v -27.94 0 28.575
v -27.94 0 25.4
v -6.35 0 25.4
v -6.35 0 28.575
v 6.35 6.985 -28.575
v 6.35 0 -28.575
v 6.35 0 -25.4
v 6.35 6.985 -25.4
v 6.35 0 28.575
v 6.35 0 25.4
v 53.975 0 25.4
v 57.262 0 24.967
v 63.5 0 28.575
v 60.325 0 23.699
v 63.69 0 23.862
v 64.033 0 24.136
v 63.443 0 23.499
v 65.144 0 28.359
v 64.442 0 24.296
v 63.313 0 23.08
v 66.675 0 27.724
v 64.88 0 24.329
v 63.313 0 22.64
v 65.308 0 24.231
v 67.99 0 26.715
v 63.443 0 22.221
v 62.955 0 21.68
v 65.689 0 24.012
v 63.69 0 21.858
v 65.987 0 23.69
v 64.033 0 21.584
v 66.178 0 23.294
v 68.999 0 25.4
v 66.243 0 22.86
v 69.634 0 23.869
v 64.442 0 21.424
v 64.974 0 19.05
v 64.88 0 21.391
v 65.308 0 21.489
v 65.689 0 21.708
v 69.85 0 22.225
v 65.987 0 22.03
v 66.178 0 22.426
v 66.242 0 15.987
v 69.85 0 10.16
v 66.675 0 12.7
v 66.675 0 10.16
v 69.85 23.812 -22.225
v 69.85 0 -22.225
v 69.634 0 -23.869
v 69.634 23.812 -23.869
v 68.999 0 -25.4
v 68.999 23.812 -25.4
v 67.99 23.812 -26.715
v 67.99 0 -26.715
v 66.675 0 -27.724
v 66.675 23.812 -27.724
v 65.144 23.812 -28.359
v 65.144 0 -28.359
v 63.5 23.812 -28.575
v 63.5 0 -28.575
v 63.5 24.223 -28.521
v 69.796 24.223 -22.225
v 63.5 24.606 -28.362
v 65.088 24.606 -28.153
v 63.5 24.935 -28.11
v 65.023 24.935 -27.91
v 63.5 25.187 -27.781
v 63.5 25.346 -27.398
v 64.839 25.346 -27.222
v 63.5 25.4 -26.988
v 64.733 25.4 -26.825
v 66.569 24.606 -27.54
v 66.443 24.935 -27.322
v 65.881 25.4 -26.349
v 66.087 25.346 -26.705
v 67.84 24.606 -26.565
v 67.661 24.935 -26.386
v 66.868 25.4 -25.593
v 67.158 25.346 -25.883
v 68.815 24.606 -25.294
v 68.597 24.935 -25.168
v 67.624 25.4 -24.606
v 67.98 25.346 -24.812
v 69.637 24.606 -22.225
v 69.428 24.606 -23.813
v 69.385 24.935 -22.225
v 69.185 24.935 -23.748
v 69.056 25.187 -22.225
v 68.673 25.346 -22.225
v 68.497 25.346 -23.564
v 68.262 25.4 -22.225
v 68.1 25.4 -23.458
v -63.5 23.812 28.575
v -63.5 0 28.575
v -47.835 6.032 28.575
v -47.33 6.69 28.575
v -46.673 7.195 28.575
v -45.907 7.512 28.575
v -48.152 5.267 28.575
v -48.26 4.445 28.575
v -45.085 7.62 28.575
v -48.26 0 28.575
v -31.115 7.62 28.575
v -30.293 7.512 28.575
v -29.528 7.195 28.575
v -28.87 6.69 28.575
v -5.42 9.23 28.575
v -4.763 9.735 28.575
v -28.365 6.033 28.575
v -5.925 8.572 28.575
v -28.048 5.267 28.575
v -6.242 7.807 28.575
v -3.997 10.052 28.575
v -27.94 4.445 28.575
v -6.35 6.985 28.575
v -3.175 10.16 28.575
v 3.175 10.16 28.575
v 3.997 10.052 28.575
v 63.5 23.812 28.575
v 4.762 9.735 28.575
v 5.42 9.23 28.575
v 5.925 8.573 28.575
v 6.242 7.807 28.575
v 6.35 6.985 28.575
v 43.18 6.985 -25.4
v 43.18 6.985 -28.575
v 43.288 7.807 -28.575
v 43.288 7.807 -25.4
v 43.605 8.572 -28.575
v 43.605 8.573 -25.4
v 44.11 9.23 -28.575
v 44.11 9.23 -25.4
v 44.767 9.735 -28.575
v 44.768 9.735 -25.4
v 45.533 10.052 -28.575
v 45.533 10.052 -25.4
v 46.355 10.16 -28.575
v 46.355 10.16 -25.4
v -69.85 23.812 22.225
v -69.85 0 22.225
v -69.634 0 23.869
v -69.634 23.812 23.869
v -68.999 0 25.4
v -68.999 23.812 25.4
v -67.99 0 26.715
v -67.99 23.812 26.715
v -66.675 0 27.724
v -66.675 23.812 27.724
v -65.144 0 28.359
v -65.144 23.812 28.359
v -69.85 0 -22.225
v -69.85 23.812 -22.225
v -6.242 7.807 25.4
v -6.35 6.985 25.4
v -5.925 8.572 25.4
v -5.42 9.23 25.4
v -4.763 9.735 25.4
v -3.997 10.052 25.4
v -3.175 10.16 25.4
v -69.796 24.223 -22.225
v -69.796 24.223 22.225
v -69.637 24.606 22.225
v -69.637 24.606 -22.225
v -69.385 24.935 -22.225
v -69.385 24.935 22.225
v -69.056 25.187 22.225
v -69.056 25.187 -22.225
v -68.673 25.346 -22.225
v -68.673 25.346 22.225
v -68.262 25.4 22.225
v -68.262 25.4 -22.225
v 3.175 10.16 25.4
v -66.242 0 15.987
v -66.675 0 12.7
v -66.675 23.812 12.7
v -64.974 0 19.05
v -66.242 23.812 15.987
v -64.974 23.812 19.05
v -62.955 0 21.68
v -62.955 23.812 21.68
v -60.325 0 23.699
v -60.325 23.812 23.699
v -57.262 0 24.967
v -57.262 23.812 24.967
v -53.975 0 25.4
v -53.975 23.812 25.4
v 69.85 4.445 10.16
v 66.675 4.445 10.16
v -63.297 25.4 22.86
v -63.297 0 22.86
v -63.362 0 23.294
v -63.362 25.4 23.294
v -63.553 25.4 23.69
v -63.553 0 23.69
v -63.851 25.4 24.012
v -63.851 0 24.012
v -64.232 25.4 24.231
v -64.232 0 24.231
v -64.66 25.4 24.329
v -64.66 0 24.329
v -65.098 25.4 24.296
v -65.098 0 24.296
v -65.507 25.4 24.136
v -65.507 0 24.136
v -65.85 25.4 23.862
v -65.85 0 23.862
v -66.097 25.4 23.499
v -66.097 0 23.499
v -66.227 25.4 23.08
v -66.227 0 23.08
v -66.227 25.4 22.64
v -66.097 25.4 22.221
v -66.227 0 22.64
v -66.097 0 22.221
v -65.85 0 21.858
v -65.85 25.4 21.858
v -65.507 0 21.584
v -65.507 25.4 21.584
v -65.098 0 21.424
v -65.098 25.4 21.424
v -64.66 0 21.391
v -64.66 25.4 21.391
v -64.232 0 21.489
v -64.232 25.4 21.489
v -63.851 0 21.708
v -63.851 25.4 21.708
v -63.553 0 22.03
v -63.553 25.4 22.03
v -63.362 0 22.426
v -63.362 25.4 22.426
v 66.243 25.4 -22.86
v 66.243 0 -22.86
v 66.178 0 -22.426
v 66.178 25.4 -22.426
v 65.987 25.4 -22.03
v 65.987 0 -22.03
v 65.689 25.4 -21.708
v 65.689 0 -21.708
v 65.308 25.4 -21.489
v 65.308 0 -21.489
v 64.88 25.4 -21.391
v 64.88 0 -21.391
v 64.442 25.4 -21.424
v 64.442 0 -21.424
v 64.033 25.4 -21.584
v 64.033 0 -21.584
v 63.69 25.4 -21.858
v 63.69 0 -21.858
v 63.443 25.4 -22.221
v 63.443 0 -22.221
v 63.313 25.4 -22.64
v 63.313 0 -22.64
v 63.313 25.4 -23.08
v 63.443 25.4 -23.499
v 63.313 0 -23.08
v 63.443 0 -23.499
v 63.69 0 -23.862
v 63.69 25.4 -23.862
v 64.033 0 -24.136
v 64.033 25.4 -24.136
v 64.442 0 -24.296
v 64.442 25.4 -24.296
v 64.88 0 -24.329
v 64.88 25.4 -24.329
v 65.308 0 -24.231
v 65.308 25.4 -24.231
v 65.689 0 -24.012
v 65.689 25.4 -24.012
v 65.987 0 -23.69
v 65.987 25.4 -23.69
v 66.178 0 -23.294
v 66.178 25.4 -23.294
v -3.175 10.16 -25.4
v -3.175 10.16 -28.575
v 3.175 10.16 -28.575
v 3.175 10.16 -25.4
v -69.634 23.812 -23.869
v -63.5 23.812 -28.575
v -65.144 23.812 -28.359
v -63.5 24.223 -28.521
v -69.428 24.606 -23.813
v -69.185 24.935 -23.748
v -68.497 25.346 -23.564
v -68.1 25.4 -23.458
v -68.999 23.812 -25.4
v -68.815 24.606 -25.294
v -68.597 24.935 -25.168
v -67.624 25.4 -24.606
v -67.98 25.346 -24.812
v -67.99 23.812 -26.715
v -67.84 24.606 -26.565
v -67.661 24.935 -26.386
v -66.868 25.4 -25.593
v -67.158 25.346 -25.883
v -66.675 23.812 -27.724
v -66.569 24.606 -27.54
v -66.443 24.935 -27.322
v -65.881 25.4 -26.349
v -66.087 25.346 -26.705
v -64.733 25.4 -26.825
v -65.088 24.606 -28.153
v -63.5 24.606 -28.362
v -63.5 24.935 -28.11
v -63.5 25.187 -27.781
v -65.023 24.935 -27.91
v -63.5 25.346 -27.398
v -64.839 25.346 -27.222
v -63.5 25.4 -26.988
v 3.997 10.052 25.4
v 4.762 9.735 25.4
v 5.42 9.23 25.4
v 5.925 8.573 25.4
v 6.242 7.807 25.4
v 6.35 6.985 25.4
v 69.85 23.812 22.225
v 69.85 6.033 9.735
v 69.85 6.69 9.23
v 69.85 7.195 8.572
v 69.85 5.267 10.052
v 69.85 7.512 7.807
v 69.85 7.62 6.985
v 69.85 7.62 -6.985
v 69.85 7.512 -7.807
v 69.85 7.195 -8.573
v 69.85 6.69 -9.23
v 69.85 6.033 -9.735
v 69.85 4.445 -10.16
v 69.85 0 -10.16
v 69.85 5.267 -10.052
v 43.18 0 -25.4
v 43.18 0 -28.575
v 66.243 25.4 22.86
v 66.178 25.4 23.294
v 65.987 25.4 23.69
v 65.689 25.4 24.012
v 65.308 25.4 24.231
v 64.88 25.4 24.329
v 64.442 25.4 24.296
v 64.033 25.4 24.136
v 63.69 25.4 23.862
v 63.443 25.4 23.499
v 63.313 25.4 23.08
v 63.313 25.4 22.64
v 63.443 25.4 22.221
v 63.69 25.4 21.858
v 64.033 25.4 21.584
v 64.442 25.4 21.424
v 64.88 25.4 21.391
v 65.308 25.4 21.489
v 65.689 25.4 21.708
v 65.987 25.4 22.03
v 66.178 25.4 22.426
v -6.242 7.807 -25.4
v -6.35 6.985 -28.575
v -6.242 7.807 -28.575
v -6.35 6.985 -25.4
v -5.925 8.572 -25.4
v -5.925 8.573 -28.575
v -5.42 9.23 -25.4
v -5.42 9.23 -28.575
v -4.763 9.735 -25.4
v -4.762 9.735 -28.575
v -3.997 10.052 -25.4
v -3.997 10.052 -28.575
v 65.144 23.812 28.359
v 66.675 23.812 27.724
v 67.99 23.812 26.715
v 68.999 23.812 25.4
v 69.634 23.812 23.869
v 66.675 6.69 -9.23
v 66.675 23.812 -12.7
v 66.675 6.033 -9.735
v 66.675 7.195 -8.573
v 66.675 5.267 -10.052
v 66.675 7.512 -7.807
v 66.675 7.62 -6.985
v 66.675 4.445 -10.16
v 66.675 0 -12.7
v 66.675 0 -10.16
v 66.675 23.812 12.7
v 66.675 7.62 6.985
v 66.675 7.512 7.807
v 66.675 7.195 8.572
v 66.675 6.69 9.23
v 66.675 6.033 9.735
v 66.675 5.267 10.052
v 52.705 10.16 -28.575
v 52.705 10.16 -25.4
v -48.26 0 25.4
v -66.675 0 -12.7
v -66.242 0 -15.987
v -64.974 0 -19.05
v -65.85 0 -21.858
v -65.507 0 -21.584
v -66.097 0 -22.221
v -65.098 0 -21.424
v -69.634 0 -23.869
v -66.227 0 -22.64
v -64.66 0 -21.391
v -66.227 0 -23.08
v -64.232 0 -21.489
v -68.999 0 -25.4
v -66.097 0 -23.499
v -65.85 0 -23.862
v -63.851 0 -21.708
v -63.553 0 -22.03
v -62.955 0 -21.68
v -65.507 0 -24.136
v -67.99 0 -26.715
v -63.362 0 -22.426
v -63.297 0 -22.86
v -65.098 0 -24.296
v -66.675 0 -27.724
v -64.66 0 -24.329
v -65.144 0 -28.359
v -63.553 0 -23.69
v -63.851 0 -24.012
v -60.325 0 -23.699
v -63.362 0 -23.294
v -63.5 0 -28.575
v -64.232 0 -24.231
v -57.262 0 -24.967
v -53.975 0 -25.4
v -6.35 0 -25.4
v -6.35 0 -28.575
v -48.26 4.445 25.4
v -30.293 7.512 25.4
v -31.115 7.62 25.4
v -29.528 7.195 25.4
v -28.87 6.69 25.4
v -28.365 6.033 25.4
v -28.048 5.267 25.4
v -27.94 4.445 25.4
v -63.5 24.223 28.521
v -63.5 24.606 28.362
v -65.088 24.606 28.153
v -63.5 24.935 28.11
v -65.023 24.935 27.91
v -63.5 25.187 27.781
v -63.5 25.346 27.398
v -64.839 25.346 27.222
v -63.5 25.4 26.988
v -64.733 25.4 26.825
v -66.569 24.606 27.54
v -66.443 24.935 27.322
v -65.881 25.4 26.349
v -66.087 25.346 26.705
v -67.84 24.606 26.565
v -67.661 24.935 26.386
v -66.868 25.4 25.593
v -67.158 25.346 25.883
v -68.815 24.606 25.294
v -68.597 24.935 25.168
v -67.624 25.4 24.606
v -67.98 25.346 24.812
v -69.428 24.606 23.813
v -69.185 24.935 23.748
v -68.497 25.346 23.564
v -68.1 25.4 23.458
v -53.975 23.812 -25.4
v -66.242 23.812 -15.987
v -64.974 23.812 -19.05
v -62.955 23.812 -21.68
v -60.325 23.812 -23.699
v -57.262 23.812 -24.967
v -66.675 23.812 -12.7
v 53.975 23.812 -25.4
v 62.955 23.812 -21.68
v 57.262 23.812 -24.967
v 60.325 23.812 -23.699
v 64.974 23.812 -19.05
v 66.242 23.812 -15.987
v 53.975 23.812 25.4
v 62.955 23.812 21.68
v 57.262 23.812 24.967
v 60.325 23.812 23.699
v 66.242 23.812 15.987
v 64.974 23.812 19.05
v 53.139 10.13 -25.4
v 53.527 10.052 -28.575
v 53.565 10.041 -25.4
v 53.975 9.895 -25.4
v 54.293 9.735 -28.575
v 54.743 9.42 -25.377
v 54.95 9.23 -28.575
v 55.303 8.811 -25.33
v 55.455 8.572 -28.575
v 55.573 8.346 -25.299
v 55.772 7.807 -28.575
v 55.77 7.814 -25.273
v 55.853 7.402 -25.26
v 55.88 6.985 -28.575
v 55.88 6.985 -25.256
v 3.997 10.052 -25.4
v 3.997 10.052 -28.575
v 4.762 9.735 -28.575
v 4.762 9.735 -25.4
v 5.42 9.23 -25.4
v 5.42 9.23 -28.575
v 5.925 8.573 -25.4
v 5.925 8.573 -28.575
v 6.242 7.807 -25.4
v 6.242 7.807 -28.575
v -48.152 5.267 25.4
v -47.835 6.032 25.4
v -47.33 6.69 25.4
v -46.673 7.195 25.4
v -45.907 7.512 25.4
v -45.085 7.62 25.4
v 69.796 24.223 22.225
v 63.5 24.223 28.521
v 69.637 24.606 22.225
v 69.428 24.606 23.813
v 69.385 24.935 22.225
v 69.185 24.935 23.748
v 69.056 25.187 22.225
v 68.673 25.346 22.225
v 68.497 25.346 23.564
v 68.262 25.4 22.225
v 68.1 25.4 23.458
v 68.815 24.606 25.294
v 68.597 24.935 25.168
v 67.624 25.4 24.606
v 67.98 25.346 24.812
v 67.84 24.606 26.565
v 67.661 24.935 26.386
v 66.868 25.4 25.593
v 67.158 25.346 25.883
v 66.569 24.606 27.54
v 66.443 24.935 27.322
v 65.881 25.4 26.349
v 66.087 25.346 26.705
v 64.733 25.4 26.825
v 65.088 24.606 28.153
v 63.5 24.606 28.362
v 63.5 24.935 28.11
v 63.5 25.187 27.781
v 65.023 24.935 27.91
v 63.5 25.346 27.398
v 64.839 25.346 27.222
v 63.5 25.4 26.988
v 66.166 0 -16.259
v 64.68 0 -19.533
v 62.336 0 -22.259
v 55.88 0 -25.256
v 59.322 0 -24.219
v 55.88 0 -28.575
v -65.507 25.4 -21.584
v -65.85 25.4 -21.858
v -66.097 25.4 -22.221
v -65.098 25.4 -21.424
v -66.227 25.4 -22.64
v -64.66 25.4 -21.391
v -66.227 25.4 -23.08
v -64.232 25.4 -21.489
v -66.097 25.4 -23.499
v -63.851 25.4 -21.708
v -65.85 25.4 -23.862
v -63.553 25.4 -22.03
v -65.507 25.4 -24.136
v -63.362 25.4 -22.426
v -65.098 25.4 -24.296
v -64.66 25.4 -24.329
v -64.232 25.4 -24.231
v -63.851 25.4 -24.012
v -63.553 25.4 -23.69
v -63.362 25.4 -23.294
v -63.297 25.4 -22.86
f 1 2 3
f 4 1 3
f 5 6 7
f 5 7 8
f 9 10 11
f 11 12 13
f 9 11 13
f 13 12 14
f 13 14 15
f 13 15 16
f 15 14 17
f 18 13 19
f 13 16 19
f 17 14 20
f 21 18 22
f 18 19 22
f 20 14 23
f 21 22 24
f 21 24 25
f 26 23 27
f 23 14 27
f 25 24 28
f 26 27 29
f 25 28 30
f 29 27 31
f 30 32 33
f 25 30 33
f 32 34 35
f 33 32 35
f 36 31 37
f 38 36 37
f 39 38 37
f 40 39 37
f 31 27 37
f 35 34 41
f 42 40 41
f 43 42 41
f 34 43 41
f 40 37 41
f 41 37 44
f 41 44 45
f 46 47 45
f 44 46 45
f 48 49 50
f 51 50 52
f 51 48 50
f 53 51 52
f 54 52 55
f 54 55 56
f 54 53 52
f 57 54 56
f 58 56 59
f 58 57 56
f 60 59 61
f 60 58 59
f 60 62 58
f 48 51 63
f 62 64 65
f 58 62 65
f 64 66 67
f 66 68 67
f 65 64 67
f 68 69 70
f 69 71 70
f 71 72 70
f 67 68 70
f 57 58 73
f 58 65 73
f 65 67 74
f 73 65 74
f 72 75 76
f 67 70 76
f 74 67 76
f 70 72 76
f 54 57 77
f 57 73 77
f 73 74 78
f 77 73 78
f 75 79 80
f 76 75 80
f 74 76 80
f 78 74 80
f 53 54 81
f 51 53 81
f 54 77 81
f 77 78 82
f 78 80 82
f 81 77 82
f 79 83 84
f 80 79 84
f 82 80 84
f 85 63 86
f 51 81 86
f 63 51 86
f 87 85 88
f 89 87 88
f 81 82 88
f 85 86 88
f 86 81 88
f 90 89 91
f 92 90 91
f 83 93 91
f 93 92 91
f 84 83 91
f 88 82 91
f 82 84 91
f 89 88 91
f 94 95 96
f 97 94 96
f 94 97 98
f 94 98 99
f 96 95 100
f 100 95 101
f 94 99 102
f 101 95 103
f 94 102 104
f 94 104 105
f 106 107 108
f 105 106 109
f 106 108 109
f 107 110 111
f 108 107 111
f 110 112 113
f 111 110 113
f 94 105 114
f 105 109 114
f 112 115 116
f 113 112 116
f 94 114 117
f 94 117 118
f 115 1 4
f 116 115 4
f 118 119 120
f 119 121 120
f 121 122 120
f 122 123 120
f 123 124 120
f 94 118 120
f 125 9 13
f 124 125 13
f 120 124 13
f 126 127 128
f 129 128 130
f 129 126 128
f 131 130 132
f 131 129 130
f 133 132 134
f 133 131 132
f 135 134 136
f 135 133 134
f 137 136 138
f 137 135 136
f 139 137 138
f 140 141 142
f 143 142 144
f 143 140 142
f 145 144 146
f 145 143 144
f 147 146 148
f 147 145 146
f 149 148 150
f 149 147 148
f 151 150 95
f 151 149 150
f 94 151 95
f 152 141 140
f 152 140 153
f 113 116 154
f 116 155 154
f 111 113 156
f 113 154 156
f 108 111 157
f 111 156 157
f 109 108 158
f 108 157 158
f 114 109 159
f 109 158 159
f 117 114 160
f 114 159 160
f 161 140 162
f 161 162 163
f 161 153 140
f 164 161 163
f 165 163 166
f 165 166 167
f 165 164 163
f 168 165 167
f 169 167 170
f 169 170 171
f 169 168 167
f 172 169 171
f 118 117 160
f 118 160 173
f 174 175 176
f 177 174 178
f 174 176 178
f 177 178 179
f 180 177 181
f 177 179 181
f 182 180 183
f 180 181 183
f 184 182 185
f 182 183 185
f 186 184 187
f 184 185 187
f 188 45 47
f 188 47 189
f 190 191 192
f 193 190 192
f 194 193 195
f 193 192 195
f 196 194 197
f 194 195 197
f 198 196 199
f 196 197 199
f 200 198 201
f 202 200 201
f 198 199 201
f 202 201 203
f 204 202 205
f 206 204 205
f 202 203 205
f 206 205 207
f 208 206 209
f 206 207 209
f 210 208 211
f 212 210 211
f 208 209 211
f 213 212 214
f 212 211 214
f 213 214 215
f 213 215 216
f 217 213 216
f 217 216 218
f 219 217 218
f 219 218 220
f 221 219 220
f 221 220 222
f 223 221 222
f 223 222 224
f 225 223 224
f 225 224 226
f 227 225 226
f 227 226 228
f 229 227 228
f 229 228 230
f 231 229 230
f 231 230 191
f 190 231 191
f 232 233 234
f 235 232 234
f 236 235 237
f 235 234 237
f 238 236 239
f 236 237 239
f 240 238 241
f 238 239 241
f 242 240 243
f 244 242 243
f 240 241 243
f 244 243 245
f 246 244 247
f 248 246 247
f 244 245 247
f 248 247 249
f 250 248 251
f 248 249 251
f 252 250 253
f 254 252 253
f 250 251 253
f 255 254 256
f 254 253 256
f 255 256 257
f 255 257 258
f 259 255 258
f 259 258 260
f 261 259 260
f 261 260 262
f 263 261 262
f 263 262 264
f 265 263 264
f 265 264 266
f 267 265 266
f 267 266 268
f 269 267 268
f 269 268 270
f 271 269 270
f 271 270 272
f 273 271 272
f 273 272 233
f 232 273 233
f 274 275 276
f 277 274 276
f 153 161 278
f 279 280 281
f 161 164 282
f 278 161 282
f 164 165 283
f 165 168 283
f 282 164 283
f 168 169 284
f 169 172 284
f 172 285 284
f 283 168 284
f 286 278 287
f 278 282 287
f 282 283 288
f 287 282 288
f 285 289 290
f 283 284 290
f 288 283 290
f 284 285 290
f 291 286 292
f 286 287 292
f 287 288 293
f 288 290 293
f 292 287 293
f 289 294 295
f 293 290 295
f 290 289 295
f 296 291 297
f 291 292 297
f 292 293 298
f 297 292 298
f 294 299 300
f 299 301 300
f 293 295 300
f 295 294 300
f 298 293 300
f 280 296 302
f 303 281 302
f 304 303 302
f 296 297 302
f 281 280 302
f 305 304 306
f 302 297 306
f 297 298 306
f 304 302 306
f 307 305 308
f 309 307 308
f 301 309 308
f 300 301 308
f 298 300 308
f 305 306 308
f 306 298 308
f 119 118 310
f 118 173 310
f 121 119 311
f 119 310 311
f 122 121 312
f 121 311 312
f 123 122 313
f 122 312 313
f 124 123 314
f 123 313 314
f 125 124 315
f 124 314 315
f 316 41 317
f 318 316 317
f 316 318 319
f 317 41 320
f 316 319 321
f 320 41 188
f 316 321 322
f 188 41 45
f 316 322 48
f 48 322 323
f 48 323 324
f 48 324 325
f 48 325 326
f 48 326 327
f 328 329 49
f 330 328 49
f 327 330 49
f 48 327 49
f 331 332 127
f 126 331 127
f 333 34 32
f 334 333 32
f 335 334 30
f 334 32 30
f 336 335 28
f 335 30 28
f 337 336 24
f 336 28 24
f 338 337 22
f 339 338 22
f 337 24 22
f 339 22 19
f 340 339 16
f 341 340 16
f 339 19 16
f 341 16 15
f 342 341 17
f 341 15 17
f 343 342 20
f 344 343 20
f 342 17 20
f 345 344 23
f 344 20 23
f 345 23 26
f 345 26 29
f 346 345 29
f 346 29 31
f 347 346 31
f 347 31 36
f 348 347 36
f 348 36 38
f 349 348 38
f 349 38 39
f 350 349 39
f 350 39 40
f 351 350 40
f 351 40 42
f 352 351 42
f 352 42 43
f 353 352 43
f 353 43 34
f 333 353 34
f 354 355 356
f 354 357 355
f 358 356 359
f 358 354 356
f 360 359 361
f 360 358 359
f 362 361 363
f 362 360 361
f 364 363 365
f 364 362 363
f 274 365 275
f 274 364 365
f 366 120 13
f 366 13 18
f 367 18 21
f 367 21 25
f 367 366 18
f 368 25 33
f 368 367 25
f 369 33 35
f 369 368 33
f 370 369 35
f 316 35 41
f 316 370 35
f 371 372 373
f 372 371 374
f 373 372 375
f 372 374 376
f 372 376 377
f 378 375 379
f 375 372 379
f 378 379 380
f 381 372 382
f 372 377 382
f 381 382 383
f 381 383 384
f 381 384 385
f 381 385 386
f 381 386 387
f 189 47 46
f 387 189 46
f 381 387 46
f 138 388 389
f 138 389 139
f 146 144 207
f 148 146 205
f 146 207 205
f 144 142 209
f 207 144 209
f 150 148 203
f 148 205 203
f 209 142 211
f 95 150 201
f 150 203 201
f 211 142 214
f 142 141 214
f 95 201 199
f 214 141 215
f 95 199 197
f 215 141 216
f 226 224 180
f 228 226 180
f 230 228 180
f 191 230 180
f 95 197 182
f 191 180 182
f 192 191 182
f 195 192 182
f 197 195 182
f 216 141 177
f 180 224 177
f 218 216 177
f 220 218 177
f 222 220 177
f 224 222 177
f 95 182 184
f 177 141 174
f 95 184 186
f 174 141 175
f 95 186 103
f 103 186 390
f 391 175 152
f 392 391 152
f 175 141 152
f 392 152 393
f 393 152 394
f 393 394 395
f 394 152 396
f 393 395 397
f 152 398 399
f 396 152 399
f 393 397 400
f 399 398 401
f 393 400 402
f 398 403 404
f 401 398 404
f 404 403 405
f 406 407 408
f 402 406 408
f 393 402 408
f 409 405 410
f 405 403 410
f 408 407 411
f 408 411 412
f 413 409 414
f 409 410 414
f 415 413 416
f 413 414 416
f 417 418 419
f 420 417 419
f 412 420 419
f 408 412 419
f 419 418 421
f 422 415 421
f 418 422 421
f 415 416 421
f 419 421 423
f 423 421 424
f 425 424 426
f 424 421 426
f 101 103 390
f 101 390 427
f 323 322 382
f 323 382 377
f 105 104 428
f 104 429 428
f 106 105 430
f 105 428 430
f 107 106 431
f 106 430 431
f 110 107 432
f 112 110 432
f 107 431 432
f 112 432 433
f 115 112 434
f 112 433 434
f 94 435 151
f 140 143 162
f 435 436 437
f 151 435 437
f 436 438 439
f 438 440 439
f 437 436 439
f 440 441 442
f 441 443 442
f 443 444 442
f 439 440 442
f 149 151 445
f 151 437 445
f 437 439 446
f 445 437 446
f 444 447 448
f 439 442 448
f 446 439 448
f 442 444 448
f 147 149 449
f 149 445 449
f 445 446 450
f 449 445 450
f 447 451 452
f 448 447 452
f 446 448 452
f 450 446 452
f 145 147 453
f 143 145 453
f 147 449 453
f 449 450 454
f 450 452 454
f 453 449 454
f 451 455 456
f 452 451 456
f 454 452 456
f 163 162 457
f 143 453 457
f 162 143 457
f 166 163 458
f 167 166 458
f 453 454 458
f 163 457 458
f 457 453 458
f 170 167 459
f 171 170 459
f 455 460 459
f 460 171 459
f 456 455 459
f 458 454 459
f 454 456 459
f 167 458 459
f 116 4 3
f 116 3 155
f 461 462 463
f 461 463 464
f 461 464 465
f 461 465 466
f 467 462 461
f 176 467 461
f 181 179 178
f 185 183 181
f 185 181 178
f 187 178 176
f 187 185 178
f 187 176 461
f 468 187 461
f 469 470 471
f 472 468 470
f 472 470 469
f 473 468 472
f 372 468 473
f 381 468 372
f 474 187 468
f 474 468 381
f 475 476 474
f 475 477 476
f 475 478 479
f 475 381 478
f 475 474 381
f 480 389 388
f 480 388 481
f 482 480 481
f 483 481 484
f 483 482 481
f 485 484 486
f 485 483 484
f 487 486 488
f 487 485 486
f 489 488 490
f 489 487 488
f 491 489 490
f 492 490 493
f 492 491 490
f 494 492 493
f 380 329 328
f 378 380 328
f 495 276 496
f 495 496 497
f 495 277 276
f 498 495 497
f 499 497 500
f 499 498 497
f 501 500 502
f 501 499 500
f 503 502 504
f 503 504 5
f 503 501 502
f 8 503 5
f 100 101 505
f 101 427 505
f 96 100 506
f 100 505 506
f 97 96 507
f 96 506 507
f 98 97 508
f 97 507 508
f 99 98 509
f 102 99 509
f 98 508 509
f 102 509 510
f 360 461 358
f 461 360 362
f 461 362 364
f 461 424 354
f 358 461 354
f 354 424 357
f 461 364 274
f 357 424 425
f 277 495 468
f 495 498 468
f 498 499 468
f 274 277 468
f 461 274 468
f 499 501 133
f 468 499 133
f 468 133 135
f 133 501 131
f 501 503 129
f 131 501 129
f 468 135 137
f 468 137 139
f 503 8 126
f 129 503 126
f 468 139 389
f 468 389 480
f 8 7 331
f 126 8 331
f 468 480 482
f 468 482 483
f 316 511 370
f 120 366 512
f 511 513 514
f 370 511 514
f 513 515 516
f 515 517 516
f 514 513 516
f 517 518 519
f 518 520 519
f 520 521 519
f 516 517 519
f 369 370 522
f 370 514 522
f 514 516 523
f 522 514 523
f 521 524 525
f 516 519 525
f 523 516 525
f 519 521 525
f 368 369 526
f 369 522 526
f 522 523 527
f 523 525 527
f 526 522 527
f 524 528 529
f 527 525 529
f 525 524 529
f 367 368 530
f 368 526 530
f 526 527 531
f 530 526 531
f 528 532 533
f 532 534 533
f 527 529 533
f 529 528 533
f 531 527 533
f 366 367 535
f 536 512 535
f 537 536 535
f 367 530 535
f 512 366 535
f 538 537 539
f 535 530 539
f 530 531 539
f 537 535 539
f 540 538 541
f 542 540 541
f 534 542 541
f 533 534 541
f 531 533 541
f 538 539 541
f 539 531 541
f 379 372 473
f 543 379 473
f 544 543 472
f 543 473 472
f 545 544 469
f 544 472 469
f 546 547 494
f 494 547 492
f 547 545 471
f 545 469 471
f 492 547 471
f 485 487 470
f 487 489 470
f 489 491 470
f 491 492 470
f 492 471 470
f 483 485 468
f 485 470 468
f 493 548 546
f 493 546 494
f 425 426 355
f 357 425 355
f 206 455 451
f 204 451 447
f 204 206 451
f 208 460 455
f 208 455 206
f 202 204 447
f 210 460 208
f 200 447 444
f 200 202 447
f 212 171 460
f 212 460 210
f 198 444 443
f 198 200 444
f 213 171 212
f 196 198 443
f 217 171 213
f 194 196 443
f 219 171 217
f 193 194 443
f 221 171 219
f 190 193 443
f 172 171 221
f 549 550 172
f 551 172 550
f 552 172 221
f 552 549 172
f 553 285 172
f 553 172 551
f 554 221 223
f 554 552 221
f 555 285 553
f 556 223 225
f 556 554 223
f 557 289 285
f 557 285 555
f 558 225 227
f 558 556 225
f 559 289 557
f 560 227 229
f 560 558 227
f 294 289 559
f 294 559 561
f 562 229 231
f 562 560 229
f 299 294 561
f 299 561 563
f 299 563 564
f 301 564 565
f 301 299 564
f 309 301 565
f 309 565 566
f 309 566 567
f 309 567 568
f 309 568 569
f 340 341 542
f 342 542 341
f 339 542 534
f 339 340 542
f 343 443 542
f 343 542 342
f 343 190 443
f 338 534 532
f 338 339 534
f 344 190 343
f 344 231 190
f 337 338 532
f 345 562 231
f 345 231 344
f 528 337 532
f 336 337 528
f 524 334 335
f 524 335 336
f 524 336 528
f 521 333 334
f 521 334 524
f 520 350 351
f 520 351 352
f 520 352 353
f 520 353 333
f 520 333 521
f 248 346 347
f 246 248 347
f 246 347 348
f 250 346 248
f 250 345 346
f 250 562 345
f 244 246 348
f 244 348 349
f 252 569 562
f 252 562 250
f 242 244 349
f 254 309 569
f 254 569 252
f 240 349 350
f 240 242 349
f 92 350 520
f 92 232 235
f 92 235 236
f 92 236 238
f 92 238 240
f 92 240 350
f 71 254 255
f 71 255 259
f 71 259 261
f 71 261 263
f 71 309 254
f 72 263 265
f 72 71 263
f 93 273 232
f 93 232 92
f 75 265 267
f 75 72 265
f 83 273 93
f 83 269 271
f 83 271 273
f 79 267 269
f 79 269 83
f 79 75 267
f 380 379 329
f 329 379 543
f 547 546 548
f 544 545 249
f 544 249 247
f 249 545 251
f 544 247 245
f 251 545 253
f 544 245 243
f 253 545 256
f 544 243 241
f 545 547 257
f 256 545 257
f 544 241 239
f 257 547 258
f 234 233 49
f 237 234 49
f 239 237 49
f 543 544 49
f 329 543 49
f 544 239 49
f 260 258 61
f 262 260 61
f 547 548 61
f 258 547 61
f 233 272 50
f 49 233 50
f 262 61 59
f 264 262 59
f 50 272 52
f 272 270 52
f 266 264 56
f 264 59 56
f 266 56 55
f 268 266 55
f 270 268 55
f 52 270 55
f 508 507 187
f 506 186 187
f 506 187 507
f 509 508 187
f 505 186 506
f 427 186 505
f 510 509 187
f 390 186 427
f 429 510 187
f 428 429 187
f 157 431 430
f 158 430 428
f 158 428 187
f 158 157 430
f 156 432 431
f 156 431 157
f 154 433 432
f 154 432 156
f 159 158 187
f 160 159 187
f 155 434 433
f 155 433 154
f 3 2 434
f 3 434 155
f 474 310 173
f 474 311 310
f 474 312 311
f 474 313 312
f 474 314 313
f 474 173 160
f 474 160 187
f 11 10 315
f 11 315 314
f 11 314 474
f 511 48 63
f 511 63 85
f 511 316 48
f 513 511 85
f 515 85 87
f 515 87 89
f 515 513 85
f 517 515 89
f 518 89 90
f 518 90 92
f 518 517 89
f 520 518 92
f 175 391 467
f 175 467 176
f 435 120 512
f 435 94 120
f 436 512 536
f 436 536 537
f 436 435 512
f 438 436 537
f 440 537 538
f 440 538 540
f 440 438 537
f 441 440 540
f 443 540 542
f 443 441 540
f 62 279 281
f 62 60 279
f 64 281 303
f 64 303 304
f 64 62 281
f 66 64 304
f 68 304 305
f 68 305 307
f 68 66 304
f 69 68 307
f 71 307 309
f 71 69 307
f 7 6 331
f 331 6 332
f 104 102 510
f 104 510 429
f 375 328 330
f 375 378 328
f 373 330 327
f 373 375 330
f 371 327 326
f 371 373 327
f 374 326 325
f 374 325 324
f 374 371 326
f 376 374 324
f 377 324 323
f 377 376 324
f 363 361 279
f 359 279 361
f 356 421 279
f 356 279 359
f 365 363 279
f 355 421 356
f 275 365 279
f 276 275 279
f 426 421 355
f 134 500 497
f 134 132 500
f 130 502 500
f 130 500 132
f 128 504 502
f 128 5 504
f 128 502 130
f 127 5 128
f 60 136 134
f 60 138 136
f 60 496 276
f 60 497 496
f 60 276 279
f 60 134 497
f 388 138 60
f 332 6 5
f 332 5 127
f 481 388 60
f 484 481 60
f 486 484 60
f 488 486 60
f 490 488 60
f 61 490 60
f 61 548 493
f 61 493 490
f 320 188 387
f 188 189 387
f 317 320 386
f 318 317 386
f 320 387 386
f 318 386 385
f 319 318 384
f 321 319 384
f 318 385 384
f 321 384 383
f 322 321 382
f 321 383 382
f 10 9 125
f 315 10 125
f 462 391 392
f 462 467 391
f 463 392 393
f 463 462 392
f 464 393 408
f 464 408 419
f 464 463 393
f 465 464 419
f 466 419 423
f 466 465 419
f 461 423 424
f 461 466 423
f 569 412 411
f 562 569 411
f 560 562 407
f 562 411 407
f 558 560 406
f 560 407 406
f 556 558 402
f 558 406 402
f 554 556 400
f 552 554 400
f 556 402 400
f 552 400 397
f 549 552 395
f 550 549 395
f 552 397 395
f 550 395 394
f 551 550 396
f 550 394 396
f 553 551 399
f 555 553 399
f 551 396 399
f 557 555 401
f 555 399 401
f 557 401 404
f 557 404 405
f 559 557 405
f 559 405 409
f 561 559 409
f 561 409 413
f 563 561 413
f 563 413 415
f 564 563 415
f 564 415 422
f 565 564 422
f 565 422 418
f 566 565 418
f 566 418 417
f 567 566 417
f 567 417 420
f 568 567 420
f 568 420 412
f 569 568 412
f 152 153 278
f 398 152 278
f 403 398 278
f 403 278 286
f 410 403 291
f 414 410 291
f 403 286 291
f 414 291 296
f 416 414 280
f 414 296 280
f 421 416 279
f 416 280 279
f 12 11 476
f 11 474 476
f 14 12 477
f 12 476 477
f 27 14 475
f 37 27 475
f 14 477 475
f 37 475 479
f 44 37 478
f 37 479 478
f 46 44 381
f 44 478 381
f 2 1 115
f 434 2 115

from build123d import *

# Parameters (mm, degrees)
SKETCH1_W             = 139.7
SKETCH1_H             = 57.15
BOSS_EXTRUDE1_DEPTH   = 25.4
FILLET1_R             = 6.35
SKETCH5_W             = 133.35
SKETCH5_H             = 50.8
CUT_EXTRUDE1_DEPTH    = 23.8125
FILLET5_R             = 12.7
F_4_CLEARANCE_HOLE1_D = 2.9464
FILLET6_R             = 1.5875
CUT_EXTRUDE2_REACH    = 146.837
SKETCH6_W             = 20.32
SKETCH6_H             = 7.62
CUT_EXTRUDE3_REACH    = 95.757
SKETCH7_W             = 20.32
SKETCH7_H             = 7.62
CUT_EXTRUDE4_REACH    = 95.757
SKETCH8_W             = 12.7
SKETCH8_H             = 10.16
FILLET7_R             = 3.175
CUT_EXTRUDE5_REACH    = 95.757
SKETCH9_W             = 12.7
SKETCH9_H             = 10.16
FILLET9_R             = 3.175


with BuildPart() as part:
    # Sketch1 → Boss-Extrude1 (new body)
    with BuildSketch(Plane(origin=(0, 0, 0), x_dir=(1, 0, 0), z_dir=(0, 1, 0))):
        Rectangle(SKETCH1_W, SKETCH1_H)
    extrude(amount=BOSS_EXTRUDE1_DEPTH)

    # Fillet1
    fillet1_edges = [part.edges().sort_by_distance(p)[0] for p in [
        (69.85, 12.7, 28.575),
        (-69.85, 12.7, 28.575),
        (-69.85, 12.7, -28.575),
        (69.85, 12.7, -28.575),
    ]]
    fillet(fillet1_edges, radius=FILLET1_R)

    # Sketch5 → Cut-Extrude1 (cut)
    with BuildSketch(Plane.XZ):
        Rectangle(SKETCH5_W, SKETCH5_H)
    extrude(amount=-CUT_EXTRUDE1_DEPTH, mode=Mode.SUBTRACT)

    # Fillet5
    fillet5_edges = [part.edges().sort_by_distance(p)[0] for p in [
        (-66.675, 11.90625, 25.4),
        (66.675, 11.90625, 25.4),
        (66.675, 11.90625, -25.4),
        (-66.675, 11.90625, -25.4),
    ]]
    fillet(fillet5_edges, radius=FILLET5_R)

    # #4 Clearance Hole1 (through all)
    with Locations(Plane(origin=(0, 25.4, 0), x_dir=(-1, 0, 0), z_dir=(0, 1, 0))):
        with Locations((64.77, -22.86), (64.77, 22.86), (-64.77, -22.86), (-64.77, 22.86)):
            Hole(F_4_CLEARANCE_HOLE1_D / 2)

    # Fillet6
    fillet6_edges = [part.edges().sort_by_distance(p)[0] for p in [
        (-69.85, 25.4, 0),
        (0, 25.4, -28.575),
        (69.85, 25.4, 0),
        (0, 25.4, 28.575),
        (-67.990128061, 25.4, 26.715128061),
        (67.990128061, 25.4, 26.715128061),
        (67.990128061, 25.4, -26.715128061),
        (-67.990128061, 25.4, -26.715128061),
    ]]
    fillet(fillet6_edges, radius=FILLET6_R)

    # Sketch6 → Cut-Extrude2 (cut, up to next)
    with BuildSketch(Plane(origin=(69.85, 0, 0), x_dir=(0, 0, -1), z_dir=(1, 0, 0)), mode=Mode.PRIVATE) as cut_extrude2_sk1:
        with Locations((0, 3.81)):
            Rectangle(SKETCH6_W, SKETCH6_H)
    cut_extrude2_tool1 = extrude(cut_extrude2_sk1.sketch, amount=-CUT_EXTRUDE2_REACH, mode=Mode.PRIVATE) & part.part
    add(cut_extrude2_tool1.solids().sort_by_distance((69.85, 3.81, 0))[0], mode=Mode.SUBTRACT)

    # Sketch7 → Cut-Extrude3 (cut, up to next)
    with BuildSketch(Plane.XY.offset(28.575), mode=Mode.PRIVATE) as cut_extrude3_sk1:
        with Locations((-38.1, 3.81)):
            Rectangle(SKETCH7_W, SKETCH7_H)
    cut_extrude3_tool1 = extrude(cut_extrude3_sk1.sketch, amount=-CUT_EXTRUDE3_REACH, mode=Mode.PRIVATE) & part.part
    add(cut_extrude3_tool1.solids().sort_by_distance((-38.1, 3.81, 28.575))[0], mode=Mode.SUBTRACT)

    # Sketch8 → Cut-Extrude4 (cut, up to next)
    with BuildSketch(Plane(origin=(0, 0, -28.575), x_dir=(-1, 0, 0), z_dir=(0, 0, -1)), mode=Mode.PRIVATE) as cut_extrude4_sk1:
        with Locations((-49.53, 5.08)):
            Rectangle(SKETCH8_W, SKETCH8_H)
    cut_extrude4_tool1 = extrude(cut_extrude4_sk1.sketch, amount=-CUT_EXTRUDE4_REACH, mode=Mode.PRIVATE) & part.part
    add(cut_extrude4_tool1.solids().sort_by_distance((49.53, 5.08, -28.575))[0], mode=Mode.SUBTRACT)

    # Fillet7
    fillet7_edges = [part.edges().sort_by_distance(p)[0] for p in [
        (68.2625, 7.62, -10.16),
        (68.2625, 7.62, 10.16),
        (-27.94, 7.62, 26.9875),
        (-48.26, 7.62, 26.9875),
        (43.18, 10.16, -26.9875),
        (55.88, 10.16, -26.915656079),
    ]]
    fillet(fillet7_edges, radius=FILLET7_R)

    # Sketch9 → Cut-Extrude5 (cut, up to next)
    with BuildSketch(Plane.XY.offset(28.575), mode=Mode.PRIVATE) as cut_extrude5_sk1:
        with Locations((0, 5.08)):
            Rectangle(SKETCH9_W, SKETCH9_H)
    cut_extrude5_tool1 = extrude(cut_extrude5_sk1.sketch, amount=-CUT_EXTRUDE5_REACH, mode=Mode.PRIVATE) & part.part
    cut_extrude5 = cut_extrude5_tool1.solids().sort_by_distance((0, 5.08, 28.575))[0]
    add(cut_extrude5, mode=Mode.SUBTRACT)

    # Mirror1: Cut-Extrude5 across plane
    add(cut_extrude5.mirror(Plane.XY), mode=Mode.SUBTRACT)

    # Fillet9
    fillet9_edges = [part.edges().sort_by_distance(p)[0] for p in [
        (6.35, 10.16, 26.9875),
        (-6.35, 10.16, 26.9875),
        (6.35, 10.16, -26.9875),
        (-6.35, 10.16, -26.9875),
    ]]
    fillet(fillet9_edges, radius=FILLET9_R)


solid = part.part
